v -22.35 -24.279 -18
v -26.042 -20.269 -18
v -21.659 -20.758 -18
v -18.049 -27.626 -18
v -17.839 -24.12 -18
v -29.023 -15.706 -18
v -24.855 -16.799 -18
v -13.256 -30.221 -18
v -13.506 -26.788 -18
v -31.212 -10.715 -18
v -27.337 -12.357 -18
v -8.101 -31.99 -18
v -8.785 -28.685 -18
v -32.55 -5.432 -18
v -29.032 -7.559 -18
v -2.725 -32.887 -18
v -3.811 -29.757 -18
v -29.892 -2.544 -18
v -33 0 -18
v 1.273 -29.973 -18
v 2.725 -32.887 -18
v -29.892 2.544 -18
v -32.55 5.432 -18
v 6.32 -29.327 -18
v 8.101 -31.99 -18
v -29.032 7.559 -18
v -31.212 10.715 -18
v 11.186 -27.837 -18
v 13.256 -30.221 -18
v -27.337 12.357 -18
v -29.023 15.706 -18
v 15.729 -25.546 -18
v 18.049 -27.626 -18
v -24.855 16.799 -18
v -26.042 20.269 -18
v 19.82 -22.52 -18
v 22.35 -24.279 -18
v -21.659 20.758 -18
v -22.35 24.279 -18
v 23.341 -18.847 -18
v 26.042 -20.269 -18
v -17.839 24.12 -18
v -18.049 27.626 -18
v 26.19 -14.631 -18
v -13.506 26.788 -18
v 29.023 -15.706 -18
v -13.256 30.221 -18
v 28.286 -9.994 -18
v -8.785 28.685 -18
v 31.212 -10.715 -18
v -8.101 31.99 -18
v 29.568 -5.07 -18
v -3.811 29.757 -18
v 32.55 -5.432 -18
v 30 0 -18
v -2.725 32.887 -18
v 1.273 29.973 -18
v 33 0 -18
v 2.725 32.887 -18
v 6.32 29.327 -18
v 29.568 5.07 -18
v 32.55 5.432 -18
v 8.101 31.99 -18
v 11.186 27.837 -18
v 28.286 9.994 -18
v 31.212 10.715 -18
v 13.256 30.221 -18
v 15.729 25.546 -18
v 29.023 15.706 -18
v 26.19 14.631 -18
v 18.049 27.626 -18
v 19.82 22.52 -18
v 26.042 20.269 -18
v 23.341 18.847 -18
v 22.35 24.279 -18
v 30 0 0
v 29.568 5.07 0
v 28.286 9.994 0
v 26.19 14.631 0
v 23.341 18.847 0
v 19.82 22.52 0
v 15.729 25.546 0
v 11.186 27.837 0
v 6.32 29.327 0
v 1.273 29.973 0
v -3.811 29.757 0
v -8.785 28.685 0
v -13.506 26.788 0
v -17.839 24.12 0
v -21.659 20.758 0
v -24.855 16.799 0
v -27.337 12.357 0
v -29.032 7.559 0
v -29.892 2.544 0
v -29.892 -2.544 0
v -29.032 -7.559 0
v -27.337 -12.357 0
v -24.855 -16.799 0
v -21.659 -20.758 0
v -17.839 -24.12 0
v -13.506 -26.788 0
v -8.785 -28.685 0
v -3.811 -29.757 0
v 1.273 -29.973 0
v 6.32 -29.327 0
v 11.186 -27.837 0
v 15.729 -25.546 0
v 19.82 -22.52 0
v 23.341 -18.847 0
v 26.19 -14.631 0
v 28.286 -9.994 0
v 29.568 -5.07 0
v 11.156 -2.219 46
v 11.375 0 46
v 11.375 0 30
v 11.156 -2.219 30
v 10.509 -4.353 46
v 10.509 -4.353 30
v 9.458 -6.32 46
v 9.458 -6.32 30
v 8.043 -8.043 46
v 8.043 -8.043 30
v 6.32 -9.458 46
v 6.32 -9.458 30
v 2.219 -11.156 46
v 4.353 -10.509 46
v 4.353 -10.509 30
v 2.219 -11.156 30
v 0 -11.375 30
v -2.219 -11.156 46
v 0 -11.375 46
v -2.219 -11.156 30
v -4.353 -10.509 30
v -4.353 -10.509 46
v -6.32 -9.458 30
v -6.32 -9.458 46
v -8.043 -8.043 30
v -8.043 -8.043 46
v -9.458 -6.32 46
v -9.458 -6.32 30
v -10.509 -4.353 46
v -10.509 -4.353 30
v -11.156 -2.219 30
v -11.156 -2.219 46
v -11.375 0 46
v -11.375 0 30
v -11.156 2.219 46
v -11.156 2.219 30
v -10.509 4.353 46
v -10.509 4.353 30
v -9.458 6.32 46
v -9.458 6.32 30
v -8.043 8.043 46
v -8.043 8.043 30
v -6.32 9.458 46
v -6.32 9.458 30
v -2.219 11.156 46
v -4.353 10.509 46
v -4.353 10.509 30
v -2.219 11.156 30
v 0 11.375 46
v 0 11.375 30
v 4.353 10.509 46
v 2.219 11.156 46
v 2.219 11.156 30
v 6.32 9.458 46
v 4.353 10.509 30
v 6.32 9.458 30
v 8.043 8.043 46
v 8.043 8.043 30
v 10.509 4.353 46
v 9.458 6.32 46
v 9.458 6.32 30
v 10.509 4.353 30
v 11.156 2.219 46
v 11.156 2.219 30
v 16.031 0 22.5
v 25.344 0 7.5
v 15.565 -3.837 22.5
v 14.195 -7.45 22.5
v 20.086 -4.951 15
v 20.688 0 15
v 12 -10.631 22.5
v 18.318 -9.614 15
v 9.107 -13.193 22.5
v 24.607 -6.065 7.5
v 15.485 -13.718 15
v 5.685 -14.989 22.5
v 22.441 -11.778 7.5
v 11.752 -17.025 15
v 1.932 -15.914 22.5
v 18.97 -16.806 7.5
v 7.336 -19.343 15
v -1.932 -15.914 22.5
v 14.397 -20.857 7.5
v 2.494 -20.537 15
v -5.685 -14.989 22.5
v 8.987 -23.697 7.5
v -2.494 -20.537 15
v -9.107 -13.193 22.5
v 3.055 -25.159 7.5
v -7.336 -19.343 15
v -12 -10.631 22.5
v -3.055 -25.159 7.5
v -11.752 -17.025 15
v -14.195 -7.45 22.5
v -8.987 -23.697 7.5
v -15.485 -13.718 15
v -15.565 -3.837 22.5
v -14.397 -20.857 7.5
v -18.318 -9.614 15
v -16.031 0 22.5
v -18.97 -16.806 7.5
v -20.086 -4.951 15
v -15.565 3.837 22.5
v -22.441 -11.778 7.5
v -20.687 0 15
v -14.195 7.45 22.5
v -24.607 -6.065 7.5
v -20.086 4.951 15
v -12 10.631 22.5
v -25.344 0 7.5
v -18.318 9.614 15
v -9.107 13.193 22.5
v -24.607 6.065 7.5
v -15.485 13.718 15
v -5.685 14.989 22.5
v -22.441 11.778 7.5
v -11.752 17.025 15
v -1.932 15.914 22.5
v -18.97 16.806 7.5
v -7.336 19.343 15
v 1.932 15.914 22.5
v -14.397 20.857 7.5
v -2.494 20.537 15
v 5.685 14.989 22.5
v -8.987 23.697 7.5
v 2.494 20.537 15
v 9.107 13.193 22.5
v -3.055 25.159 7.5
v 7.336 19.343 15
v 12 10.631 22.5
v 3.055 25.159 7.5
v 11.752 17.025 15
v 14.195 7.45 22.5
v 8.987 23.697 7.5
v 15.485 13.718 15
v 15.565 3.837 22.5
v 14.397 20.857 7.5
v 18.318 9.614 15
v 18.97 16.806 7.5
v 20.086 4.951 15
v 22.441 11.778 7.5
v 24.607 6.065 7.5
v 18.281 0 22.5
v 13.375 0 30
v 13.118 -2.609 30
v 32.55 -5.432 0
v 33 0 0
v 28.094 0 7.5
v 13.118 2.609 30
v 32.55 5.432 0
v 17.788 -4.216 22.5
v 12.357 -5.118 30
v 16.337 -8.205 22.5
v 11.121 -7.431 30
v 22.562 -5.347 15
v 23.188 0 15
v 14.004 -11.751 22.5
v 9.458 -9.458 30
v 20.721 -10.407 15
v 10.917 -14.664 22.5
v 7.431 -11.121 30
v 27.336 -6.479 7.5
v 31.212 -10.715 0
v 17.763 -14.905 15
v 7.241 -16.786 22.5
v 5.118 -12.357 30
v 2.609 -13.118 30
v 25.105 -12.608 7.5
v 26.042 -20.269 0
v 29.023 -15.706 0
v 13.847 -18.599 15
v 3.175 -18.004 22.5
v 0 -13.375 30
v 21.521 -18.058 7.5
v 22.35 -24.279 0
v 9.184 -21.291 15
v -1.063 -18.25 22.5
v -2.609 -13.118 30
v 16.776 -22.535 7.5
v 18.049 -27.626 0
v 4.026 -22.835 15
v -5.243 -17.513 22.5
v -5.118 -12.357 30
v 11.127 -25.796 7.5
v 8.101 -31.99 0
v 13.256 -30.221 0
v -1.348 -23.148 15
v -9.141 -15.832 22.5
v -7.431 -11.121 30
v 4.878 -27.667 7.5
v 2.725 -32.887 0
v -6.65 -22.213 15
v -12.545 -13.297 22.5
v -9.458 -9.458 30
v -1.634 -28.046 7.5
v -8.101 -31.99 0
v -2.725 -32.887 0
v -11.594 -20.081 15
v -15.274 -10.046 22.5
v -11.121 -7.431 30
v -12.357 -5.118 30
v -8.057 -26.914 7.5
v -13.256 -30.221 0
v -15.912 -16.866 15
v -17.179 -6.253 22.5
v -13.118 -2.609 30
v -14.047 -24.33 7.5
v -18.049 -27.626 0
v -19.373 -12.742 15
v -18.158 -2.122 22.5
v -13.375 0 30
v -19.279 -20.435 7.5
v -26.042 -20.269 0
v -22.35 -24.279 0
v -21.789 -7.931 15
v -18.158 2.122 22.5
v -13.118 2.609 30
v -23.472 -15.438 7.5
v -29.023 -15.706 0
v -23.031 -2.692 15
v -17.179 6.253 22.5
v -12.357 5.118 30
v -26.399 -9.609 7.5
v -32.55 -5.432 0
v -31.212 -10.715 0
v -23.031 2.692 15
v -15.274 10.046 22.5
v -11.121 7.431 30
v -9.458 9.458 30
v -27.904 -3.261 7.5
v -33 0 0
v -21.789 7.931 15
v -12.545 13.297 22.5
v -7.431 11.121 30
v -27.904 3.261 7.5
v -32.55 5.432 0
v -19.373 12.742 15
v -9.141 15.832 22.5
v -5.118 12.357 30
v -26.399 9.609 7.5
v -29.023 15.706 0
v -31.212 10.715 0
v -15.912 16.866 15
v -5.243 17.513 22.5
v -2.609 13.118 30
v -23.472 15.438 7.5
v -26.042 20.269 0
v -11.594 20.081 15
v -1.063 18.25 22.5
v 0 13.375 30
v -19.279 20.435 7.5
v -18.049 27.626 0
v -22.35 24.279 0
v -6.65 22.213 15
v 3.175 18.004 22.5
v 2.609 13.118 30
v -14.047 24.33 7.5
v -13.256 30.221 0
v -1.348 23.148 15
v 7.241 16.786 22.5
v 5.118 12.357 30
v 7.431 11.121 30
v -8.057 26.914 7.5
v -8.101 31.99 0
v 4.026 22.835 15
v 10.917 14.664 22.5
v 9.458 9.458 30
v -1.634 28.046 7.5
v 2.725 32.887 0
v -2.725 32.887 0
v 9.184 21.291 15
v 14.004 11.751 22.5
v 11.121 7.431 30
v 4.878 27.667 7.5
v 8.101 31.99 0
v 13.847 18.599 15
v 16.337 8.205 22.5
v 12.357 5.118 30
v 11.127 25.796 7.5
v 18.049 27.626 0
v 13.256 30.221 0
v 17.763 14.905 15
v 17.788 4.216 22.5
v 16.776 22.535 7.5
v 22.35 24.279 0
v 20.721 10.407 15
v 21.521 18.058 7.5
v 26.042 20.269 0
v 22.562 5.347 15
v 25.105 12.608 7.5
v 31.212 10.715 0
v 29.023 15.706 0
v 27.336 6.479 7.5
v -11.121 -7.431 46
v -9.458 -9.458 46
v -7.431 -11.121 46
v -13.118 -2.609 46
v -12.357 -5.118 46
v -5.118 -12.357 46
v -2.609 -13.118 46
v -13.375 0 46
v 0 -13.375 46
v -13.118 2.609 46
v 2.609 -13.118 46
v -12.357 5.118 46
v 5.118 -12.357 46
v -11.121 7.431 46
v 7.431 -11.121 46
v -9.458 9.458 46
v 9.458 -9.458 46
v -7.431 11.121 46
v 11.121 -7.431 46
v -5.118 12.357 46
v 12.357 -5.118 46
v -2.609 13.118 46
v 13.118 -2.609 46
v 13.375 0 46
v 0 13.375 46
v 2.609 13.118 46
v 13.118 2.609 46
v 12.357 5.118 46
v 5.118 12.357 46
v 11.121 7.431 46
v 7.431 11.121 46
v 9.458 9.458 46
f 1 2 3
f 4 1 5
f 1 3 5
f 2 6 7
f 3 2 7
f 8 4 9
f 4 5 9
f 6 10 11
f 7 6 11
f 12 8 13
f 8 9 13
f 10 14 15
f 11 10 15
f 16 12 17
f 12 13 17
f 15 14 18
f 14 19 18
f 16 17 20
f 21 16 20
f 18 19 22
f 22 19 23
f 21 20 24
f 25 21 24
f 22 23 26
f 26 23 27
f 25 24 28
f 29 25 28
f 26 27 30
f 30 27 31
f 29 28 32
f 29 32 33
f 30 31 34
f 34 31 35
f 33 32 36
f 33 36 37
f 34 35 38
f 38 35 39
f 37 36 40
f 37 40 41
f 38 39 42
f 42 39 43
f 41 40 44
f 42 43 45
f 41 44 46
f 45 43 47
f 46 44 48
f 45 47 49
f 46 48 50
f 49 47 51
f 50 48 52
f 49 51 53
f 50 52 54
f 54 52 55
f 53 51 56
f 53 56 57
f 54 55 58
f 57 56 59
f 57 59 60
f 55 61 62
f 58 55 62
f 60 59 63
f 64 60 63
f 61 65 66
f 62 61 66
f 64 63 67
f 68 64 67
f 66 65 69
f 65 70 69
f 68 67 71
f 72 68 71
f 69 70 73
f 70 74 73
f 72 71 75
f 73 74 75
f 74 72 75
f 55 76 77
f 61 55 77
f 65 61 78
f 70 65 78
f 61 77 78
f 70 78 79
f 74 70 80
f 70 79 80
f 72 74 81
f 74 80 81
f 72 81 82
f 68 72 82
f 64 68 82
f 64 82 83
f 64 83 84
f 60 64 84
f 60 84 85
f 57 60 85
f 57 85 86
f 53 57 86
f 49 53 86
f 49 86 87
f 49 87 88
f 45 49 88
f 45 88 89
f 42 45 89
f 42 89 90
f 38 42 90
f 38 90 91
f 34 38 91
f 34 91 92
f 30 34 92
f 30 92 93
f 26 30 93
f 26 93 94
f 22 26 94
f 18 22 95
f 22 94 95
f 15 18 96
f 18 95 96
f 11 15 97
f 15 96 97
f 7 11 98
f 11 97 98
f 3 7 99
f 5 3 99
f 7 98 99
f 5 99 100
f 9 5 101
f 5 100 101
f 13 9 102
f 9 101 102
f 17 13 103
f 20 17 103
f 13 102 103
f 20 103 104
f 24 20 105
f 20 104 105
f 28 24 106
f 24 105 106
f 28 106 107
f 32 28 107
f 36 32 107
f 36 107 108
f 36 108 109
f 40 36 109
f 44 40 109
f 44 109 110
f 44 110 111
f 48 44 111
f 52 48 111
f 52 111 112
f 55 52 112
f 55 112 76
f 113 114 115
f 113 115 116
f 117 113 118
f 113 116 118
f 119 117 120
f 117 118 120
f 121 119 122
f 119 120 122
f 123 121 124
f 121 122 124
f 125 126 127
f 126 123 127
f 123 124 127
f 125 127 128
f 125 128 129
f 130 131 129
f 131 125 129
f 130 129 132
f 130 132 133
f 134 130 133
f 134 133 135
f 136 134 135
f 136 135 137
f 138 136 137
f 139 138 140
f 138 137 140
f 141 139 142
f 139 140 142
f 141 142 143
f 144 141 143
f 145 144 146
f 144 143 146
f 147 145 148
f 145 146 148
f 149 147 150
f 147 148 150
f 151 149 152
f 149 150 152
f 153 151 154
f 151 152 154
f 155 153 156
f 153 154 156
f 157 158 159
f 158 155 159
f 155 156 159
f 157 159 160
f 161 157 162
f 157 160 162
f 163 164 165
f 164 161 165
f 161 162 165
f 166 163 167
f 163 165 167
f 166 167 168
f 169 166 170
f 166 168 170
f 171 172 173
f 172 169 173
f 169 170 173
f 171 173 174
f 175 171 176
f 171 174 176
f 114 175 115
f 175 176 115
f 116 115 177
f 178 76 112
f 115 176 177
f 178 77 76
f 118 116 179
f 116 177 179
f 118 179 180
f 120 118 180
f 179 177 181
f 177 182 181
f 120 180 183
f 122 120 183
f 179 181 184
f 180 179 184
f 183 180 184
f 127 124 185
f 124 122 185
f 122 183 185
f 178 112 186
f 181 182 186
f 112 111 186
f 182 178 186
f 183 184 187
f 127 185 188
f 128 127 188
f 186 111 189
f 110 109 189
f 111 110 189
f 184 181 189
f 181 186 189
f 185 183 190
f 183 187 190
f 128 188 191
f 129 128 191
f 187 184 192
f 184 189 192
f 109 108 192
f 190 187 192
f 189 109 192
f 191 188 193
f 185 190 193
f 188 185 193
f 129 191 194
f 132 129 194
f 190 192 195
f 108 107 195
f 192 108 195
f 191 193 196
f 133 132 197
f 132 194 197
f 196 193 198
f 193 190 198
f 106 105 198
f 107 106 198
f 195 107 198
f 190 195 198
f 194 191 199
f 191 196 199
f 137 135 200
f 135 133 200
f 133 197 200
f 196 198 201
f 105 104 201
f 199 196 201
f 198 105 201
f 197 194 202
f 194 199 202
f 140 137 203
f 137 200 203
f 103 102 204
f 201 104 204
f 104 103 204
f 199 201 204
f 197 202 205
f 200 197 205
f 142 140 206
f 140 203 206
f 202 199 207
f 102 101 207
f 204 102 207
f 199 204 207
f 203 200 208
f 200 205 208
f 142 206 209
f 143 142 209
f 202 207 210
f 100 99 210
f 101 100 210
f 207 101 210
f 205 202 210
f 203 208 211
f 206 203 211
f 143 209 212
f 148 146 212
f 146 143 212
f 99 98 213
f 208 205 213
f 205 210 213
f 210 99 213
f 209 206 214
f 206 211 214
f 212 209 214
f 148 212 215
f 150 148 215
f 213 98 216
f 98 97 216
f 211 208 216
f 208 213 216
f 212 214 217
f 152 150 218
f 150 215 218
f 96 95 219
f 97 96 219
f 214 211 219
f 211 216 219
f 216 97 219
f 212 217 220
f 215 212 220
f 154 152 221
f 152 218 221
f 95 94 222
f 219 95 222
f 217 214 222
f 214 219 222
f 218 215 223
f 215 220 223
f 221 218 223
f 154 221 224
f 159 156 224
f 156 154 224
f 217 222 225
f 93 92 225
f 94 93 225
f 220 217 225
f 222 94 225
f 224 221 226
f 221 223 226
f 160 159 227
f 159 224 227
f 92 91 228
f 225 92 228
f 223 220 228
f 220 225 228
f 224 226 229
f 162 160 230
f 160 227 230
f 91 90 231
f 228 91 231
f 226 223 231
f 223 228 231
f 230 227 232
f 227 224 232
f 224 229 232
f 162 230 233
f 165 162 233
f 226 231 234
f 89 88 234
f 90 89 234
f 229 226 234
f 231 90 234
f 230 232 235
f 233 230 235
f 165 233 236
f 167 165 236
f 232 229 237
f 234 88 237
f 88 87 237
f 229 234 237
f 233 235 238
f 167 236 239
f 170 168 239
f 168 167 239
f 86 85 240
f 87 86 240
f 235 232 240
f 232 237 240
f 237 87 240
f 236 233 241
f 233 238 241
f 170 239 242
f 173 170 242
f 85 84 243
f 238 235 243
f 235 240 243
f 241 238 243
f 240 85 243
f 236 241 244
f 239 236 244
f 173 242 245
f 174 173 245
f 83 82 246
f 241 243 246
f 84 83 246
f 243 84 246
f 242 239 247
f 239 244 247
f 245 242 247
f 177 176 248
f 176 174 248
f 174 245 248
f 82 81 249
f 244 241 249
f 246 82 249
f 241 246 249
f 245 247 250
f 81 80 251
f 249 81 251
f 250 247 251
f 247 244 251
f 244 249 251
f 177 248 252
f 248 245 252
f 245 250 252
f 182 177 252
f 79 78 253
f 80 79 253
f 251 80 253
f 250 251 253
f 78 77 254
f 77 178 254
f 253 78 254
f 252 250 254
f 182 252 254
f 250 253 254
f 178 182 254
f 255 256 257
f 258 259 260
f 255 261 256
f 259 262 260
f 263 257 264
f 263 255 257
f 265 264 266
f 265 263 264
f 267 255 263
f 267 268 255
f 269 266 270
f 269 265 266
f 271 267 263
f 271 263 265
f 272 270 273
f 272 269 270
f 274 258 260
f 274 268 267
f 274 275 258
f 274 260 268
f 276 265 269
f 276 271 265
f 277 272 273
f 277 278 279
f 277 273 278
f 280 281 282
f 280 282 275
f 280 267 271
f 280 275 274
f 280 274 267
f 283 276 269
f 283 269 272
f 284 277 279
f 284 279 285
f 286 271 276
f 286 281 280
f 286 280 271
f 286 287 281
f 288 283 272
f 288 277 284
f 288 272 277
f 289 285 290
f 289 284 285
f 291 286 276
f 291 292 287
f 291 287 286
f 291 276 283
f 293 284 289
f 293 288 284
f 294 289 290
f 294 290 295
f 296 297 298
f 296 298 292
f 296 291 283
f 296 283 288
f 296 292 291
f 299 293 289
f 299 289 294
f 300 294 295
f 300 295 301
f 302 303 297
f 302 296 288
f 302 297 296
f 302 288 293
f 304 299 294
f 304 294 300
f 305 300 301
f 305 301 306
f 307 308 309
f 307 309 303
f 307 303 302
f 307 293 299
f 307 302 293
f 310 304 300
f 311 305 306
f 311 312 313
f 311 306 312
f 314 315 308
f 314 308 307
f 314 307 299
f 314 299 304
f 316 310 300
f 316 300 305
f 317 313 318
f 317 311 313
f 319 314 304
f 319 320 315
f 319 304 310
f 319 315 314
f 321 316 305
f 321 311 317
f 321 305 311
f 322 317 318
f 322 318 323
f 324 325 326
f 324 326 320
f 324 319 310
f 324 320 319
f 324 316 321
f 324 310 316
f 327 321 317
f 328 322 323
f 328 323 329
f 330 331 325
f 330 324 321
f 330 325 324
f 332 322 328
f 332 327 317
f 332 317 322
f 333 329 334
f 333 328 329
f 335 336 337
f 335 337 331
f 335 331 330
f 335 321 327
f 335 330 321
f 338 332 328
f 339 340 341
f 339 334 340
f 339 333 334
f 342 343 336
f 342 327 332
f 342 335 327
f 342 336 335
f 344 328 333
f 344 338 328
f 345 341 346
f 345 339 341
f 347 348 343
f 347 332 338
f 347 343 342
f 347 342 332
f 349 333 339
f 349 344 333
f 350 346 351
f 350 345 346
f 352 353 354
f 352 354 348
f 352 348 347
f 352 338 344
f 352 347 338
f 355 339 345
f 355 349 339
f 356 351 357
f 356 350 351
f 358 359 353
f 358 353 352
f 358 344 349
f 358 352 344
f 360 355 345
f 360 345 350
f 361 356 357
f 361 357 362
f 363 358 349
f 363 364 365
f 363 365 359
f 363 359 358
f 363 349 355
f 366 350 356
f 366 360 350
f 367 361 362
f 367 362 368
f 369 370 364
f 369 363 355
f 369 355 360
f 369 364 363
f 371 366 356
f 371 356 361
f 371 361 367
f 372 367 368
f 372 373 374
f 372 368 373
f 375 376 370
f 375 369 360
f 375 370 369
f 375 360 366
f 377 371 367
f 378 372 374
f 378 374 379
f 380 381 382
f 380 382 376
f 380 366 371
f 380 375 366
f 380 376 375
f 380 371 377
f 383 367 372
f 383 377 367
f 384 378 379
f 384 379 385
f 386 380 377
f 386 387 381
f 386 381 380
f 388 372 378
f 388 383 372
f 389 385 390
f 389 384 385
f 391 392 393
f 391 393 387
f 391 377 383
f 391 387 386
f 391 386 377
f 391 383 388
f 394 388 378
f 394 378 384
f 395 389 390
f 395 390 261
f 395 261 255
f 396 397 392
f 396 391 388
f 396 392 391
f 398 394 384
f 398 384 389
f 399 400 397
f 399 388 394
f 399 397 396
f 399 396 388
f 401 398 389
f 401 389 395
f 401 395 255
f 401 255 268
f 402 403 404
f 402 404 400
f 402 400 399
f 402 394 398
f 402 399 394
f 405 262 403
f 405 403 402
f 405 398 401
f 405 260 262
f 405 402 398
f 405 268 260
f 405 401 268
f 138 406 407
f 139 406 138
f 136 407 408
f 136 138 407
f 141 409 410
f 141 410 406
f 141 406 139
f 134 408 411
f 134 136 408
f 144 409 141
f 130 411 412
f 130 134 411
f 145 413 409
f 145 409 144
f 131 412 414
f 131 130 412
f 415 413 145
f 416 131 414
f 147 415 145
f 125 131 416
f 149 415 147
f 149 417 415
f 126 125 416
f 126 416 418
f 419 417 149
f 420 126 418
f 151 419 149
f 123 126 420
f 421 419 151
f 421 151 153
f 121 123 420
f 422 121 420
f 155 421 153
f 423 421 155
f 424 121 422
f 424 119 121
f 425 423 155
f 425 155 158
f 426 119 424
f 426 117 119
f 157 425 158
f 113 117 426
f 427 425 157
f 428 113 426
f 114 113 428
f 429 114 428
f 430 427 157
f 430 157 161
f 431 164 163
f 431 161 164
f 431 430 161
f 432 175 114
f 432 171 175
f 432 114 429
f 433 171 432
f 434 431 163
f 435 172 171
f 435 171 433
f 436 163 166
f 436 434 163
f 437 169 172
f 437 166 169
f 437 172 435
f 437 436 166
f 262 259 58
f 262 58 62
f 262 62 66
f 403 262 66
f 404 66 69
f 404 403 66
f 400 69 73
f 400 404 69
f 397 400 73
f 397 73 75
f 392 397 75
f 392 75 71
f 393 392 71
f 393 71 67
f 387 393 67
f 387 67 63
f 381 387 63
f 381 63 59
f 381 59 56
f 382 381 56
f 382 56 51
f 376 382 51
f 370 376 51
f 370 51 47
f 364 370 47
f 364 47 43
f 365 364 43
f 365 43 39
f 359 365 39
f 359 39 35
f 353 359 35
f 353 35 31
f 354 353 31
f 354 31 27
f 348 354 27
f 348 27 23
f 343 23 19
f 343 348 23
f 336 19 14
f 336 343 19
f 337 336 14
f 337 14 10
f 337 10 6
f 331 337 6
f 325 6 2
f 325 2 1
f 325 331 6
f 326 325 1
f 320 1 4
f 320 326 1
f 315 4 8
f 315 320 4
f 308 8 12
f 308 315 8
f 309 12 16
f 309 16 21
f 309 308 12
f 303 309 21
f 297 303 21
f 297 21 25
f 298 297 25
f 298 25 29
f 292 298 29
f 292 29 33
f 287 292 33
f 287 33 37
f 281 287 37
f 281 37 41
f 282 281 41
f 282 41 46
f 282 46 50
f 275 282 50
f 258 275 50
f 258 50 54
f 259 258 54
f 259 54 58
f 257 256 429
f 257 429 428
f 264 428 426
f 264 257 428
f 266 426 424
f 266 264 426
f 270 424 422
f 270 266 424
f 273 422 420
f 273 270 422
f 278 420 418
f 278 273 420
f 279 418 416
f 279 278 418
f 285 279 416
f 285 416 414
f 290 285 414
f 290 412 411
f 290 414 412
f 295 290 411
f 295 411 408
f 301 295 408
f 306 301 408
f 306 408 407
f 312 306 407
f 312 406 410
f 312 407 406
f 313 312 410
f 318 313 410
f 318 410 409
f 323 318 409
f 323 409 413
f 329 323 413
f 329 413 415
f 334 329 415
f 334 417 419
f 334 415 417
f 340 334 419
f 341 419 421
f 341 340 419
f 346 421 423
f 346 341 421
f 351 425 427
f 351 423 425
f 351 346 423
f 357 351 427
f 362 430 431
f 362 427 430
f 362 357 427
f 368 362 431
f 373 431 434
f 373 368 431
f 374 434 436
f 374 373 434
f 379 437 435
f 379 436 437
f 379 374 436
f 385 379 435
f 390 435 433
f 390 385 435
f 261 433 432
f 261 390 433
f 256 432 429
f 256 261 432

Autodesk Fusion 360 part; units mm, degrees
sketch "Boceto1" plane through (0, 0, 0) normal (0, 0, 1) x (1, 0, 0)
  circle A0 centre (0, 0) radius 30
  circle A1 centre (0, 0) radius 33
  dimension "d1" = 60
  dimension "d10" = 3
ref_plane "PlanoDeObra1" through (0, 0, 30) normal (0, 0, 1) x (1, 0, 0)
sketch "Boceto2" plane through (0, 0, 30) normal (0, 0, 1) x (1, 0, 0)
  circle A0 centre (0, 0) radius 13.375
  circle A1 centre (0, 0) radius 11.375
  dimension "d4" = 26.75
  dimension "d5" = -2
loft "Solevación1" add profiles "Boceto2", "Boceto1" section 1 section 2
loft "Solevación2" cut profiles "Boceto2", "Boceto1" section 1 contours A1 section 2 contours A0
extrude "Extruir1" add sketch "Boceto2" along normal blind 16
extrude "Extruir2" add sketch "Boceto1" against normal blind 18
sketch "Boceto3" plane through (0, 0, 0) normal (0, 0, 1) x (1, 0, 0)
